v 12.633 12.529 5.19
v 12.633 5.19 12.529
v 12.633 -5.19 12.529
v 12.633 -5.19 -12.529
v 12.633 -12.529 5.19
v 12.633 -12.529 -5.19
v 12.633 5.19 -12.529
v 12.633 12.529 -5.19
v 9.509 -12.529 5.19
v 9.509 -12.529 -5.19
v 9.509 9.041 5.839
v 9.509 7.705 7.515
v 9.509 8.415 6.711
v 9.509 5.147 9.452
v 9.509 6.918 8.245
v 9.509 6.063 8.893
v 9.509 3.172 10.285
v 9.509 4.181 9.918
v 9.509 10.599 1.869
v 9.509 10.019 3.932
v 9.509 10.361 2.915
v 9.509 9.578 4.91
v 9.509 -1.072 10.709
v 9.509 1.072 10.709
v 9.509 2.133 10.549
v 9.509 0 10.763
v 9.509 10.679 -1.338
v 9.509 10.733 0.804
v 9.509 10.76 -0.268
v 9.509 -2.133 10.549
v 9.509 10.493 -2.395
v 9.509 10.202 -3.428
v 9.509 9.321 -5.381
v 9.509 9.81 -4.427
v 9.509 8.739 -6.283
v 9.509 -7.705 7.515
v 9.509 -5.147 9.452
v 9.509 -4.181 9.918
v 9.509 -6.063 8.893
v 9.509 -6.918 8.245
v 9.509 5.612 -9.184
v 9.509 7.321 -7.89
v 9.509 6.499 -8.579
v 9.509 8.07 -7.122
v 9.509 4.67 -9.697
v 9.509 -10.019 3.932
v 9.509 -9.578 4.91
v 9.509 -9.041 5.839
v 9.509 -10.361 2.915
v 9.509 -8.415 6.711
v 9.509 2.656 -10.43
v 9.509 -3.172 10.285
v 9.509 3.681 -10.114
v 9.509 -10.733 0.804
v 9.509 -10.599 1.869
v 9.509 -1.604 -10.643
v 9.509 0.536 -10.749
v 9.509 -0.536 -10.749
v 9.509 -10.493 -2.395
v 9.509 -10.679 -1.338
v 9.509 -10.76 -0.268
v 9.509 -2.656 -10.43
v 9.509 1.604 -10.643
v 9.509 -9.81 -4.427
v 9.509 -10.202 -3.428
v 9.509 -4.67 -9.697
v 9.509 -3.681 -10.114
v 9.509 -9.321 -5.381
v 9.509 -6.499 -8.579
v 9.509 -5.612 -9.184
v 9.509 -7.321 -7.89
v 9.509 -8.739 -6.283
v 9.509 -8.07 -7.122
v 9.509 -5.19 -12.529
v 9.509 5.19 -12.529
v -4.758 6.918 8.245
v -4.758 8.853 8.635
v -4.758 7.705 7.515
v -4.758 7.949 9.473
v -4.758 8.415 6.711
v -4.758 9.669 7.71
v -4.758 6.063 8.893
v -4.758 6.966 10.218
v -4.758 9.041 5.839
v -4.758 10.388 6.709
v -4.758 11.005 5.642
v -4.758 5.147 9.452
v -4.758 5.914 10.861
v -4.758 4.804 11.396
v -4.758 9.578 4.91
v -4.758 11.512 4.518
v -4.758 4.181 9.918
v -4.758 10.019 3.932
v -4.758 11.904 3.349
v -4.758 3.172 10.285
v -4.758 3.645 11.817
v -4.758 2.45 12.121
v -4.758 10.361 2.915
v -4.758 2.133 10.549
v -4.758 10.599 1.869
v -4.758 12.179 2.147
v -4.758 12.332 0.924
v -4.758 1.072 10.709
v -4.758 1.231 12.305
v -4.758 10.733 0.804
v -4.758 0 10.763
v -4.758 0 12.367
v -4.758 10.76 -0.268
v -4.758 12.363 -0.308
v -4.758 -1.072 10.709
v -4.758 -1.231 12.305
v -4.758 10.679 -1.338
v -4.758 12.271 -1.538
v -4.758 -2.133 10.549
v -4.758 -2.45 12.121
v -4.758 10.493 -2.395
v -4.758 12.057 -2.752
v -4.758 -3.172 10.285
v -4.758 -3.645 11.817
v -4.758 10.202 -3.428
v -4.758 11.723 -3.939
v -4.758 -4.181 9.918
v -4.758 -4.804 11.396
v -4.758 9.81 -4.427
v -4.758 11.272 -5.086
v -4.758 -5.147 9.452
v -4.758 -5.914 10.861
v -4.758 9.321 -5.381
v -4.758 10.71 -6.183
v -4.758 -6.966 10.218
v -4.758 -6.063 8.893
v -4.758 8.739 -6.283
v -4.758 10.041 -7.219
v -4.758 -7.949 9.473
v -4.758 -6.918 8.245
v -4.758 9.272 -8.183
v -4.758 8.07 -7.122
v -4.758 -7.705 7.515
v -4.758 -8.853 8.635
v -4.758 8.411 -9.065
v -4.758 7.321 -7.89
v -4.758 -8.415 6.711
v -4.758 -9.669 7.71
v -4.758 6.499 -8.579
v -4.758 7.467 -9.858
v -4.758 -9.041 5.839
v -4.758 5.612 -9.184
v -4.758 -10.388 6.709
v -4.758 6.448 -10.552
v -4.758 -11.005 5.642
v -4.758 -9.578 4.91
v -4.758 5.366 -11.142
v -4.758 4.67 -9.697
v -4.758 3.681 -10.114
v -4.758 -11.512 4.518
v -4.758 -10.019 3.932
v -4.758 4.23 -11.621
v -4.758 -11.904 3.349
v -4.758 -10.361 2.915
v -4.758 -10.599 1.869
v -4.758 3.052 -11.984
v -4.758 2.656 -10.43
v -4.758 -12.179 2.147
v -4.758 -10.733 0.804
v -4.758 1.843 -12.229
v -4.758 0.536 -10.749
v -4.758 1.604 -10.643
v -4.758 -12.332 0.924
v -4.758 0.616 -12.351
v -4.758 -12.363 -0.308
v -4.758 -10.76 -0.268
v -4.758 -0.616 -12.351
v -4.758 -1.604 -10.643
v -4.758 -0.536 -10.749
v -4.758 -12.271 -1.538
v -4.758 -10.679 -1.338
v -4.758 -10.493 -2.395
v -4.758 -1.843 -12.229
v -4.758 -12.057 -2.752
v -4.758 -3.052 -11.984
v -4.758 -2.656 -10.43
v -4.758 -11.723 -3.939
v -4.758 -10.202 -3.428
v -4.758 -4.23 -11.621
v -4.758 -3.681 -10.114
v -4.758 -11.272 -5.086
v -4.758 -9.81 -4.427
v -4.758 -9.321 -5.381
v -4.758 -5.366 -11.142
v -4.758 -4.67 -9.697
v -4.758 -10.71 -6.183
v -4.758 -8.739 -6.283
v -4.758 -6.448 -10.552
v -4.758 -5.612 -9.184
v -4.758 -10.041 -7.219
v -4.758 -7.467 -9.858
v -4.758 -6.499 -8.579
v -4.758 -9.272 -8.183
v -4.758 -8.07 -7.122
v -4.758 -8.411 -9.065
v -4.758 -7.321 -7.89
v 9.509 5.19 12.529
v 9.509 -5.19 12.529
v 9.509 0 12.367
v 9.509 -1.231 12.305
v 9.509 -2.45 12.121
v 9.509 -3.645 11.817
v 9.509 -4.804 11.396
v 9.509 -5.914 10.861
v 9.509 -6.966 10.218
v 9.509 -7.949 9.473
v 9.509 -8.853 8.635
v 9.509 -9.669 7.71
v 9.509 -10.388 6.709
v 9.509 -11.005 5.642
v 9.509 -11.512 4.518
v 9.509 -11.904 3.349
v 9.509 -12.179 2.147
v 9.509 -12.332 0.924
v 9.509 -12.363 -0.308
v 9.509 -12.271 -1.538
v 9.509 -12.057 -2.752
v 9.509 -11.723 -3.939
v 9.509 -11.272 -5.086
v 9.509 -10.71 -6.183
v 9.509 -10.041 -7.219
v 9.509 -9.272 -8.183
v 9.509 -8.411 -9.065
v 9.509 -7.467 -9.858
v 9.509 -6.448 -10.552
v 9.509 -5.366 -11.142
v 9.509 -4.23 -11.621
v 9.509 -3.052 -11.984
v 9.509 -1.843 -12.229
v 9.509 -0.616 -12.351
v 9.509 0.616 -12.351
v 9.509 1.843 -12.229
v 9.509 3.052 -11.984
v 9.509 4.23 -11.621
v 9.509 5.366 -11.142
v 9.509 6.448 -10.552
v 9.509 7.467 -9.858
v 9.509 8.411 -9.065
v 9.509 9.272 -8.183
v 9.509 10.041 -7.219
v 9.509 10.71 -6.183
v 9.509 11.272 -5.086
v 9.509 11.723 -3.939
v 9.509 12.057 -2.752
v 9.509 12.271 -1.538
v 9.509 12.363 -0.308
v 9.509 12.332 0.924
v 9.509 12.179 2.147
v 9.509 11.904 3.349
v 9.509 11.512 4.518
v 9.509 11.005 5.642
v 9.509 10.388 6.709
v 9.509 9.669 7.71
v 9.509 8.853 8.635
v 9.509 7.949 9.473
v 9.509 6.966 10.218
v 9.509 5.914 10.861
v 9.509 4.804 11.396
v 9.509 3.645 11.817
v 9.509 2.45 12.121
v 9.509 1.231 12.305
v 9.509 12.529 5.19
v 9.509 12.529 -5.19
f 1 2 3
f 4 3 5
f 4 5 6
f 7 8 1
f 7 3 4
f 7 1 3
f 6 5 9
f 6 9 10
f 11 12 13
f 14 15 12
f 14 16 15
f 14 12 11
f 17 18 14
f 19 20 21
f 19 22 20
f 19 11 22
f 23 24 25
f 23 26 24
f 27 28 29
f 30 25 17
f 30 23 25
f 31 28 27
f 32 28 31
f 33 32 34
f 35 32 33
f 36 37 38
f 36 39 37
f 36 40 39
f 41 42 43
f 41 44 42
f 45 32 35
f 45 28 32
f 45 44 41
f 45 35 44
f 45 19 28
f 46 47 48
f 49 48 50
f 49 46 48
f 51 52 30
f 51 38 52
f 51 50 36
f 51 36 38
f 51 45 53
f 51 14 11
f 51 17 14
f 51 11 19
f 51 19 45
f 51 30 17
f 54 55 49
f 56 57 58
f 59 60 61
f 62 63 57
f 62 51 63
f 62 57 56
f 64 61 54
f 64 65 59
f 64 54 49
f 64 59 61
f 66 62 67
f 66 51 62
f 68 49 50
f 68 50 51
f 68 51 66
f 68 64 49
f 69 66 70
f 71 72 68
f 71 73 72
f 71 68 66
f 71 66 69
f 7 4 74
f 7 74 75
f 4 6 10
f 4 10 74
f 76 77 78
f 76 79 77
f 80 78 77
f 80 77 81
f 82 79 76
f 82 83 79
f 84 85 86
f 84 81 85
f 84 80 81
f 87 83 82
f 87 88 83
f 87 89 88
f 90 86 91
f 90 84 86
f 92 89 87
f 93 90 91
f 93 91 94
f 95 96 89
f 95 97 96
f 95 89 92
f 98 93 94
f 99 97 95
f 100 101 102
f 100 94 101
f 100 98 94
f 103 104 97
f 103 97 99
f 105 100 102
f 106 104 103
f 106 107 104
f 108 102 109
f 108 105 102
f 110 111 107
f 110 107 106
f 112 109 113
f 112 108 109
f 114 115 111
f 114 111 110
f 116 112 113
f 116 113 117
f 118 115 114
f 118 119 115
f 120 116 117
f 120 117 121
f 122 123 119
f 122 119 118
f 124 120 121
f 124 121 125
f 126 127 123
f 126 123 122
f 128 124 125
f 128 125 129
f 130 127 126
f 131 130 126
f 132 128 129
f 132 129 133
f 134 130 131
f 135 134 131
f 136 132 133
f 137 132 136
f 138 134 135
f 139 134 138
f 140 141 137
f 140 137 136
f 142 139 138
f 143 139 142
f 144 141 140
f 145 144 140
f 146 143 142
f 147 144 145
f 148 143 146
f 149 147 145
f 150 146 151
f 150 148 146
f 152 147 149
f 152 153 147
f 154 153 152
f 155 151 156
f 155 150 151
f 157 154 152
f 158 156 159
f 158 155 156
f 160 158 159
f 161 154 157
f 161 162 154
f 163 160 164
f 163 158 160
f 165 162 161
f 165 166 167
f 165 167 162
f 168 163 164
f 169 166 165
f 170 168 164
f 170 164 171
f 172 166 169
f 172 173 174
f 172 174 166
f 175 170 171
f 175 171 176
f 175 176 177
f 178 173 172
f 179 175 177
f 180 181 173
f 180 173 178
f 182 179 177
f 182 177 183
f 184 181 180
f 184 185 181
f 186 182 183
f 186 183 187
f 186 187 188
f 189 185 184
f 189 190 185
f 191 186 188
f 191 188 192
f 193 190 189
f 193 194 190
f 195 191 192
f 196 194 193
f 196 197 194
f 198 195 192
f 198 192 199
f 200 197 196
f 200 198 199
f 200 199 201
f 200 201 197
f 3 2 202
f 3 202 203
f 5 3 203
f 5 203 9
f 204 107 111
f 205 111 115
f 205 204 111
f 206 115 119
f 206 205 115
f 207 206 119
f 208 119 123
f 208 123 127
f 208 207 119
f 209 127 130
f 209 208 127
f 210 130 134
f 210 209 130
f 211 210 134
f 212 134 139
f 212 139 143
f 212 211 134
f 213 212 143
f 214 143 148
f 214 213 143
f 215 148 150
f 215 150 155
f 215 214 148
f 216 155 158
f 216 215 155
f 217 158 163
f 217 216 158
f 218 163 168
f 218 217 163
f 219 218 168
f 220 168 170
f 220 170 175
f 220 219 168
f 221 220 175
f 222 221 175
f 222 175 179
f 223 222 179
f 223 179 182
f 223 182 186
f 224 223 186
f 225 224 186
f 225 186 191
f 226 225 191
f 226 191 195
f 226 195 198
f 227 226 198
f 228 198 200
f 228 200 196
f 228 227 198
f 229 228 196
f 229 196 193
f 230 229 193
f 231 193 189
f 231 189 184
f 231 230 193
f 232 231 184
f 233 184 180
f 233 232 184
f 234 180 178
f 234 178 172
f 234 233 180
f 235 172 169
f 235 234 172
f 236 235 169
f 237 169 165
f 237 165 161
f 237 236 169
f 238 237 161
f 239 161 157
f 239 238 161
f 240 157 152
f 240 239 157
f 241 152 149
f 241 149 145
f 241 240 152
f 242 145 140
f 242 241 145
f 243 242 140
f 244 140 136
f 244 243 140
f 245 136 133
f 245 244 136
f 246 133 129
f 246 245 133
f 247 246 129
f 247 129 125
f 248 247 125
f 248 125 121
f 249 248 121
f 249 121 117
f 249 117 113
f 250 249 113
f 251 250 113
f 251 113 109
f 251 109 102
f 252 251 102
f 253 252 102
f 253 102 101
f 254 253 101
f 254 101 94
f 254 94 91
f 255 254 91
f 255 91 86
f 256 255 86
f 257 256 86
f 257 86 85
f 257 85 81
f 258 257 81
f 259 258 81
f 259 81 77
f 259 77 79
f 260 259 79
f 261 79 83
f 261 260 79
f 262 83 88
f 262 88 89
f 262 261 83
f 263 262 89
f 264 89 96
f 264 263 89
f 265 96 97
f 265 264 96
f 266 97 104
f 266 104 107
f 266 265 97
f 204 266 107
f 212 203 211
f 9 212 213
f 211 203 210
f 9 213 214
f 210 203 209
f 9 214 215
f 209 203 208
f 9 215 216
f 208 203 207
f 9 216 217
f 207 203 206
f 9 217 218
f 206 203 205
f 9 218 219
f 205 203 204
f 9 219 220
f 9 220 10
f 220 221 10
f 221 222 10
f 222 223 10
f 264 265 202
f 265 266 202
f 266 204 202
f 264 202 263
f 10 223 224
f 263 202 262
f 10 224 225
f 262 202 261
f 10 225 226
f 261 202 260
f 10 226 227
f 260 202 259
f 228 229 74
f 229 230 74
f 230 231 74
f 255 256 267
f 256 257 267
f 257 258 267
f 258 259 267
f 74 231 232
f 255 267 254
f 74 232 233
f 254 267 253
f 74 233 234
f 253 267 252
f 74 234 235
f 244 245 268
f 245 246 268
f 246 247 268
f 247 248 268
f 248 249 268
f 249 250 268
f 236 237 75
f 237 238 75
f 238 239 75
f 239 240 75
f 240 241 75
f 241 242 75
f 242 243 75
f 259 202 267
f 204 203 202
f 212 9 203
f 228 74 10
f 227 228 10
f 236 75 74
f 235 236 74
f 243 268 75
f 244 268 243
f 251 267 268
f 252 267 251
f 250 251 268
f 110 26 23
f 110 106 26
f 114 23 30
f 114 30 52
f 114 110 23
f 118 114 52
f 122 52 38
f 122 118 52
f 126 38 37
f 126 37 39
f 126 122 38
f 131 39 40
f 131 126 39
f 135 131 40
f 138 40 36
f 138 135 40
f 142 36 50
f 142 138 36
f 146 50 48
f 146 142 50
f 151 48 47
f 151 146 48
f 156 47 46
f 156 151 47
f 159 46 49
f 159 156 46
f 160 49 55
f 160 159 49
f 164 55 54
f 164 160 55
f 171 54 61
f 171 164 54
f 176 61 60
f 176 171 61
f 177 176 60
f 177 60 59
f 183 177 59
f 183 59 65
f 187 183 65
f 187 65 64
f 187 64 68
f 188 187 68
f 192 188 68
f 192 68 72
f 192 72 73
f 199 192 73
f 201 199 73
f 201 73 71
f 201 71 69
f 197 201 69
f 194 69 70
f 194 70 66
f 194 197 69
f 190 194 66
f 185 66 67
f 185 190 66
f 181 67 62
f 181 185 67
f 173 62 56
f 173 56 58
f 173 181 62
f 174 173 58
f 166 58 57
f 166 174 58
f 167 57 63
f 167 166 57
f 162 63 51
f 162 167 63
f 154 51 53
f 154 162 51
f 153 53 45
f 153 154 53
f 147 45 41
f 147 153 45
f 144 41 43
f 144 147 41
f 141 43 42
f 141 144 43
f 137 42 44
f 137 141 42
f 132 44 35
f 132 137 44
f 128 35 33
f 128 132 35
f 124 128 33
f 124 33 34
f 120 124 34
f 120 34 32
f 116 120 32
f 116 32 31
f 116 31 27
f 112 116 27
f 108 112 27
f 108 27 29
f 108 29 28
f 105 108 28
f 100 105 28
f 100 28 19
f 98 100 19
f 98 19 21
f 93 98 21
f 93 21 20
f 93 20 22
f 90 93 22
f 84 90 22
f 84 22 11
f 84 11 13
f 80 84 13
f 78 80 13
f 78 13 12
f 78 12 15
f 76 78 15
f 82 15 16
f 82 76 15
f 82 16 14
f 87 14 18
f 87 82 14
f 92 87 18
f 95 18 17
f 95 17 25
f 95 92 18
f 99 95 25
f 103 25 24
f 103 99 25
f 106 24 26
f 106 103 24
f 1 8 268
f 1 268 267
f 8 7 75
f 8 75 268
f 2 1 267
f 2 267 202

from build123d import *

# Parameters (mm, degrees)
SKETCH2_R           = 30.1625
BOSS_EXTRUDE1_DEPTH = 7.62
SCALE1_SCALE        = 0.41


with BuildPart() as part:
    # Sketch1 → Revolve1 (revolve)
    with BuildSketch(Plane.XY, mode=Mode.PRIVATE) as revolve1_sk:
        Polygon((-21.209, -30.1625), (21.209, -30.1625), (21.209, 0), (13.589, 0), (13.589, -26.2509), (-21.209, -26.2509), align=None)
    revolve(revolve1_sk.sketch.rotate(Axis((-21.209, 0, 0), (1, 0, 0)), 270), axis=Axis((-21.209, 0, 0), (1, 0, 0)))

    # Sketch2 → Boss-Extrude1 (add)
    with BuildSketch(Plane(origin=(21.209, 0, 0), x_dir=(0, 0, -1), z_dir=(1, 0, 0))):
        Polygon((-12.658107583, 30.559375), (-30.559375, 12.658107583), (-30.559375, -12.658107583), (-12.658107583, -30.559375), (12.658107583, -30.559375), (30.559375, -12.658107583), (30.559375, 12.658107583), (12.658107583, 30.559375), align=None)
        with Locations(Location((0, 0, 0), (0, 0, 180))):
            Circle(SKETCH2_R, mode=Mode.SUBTRACT)
    extrude(amount=-BOSS_EXTRUDE1_DEPTH)


with BuildPart() as part_1:
    # Scale1: scaled about (6.673848972, 0, 0)
    add(part.part.scale(SCALE1_SCALE).moved(Location((3.937570893, 0, 0))))


solid = part_1.part
